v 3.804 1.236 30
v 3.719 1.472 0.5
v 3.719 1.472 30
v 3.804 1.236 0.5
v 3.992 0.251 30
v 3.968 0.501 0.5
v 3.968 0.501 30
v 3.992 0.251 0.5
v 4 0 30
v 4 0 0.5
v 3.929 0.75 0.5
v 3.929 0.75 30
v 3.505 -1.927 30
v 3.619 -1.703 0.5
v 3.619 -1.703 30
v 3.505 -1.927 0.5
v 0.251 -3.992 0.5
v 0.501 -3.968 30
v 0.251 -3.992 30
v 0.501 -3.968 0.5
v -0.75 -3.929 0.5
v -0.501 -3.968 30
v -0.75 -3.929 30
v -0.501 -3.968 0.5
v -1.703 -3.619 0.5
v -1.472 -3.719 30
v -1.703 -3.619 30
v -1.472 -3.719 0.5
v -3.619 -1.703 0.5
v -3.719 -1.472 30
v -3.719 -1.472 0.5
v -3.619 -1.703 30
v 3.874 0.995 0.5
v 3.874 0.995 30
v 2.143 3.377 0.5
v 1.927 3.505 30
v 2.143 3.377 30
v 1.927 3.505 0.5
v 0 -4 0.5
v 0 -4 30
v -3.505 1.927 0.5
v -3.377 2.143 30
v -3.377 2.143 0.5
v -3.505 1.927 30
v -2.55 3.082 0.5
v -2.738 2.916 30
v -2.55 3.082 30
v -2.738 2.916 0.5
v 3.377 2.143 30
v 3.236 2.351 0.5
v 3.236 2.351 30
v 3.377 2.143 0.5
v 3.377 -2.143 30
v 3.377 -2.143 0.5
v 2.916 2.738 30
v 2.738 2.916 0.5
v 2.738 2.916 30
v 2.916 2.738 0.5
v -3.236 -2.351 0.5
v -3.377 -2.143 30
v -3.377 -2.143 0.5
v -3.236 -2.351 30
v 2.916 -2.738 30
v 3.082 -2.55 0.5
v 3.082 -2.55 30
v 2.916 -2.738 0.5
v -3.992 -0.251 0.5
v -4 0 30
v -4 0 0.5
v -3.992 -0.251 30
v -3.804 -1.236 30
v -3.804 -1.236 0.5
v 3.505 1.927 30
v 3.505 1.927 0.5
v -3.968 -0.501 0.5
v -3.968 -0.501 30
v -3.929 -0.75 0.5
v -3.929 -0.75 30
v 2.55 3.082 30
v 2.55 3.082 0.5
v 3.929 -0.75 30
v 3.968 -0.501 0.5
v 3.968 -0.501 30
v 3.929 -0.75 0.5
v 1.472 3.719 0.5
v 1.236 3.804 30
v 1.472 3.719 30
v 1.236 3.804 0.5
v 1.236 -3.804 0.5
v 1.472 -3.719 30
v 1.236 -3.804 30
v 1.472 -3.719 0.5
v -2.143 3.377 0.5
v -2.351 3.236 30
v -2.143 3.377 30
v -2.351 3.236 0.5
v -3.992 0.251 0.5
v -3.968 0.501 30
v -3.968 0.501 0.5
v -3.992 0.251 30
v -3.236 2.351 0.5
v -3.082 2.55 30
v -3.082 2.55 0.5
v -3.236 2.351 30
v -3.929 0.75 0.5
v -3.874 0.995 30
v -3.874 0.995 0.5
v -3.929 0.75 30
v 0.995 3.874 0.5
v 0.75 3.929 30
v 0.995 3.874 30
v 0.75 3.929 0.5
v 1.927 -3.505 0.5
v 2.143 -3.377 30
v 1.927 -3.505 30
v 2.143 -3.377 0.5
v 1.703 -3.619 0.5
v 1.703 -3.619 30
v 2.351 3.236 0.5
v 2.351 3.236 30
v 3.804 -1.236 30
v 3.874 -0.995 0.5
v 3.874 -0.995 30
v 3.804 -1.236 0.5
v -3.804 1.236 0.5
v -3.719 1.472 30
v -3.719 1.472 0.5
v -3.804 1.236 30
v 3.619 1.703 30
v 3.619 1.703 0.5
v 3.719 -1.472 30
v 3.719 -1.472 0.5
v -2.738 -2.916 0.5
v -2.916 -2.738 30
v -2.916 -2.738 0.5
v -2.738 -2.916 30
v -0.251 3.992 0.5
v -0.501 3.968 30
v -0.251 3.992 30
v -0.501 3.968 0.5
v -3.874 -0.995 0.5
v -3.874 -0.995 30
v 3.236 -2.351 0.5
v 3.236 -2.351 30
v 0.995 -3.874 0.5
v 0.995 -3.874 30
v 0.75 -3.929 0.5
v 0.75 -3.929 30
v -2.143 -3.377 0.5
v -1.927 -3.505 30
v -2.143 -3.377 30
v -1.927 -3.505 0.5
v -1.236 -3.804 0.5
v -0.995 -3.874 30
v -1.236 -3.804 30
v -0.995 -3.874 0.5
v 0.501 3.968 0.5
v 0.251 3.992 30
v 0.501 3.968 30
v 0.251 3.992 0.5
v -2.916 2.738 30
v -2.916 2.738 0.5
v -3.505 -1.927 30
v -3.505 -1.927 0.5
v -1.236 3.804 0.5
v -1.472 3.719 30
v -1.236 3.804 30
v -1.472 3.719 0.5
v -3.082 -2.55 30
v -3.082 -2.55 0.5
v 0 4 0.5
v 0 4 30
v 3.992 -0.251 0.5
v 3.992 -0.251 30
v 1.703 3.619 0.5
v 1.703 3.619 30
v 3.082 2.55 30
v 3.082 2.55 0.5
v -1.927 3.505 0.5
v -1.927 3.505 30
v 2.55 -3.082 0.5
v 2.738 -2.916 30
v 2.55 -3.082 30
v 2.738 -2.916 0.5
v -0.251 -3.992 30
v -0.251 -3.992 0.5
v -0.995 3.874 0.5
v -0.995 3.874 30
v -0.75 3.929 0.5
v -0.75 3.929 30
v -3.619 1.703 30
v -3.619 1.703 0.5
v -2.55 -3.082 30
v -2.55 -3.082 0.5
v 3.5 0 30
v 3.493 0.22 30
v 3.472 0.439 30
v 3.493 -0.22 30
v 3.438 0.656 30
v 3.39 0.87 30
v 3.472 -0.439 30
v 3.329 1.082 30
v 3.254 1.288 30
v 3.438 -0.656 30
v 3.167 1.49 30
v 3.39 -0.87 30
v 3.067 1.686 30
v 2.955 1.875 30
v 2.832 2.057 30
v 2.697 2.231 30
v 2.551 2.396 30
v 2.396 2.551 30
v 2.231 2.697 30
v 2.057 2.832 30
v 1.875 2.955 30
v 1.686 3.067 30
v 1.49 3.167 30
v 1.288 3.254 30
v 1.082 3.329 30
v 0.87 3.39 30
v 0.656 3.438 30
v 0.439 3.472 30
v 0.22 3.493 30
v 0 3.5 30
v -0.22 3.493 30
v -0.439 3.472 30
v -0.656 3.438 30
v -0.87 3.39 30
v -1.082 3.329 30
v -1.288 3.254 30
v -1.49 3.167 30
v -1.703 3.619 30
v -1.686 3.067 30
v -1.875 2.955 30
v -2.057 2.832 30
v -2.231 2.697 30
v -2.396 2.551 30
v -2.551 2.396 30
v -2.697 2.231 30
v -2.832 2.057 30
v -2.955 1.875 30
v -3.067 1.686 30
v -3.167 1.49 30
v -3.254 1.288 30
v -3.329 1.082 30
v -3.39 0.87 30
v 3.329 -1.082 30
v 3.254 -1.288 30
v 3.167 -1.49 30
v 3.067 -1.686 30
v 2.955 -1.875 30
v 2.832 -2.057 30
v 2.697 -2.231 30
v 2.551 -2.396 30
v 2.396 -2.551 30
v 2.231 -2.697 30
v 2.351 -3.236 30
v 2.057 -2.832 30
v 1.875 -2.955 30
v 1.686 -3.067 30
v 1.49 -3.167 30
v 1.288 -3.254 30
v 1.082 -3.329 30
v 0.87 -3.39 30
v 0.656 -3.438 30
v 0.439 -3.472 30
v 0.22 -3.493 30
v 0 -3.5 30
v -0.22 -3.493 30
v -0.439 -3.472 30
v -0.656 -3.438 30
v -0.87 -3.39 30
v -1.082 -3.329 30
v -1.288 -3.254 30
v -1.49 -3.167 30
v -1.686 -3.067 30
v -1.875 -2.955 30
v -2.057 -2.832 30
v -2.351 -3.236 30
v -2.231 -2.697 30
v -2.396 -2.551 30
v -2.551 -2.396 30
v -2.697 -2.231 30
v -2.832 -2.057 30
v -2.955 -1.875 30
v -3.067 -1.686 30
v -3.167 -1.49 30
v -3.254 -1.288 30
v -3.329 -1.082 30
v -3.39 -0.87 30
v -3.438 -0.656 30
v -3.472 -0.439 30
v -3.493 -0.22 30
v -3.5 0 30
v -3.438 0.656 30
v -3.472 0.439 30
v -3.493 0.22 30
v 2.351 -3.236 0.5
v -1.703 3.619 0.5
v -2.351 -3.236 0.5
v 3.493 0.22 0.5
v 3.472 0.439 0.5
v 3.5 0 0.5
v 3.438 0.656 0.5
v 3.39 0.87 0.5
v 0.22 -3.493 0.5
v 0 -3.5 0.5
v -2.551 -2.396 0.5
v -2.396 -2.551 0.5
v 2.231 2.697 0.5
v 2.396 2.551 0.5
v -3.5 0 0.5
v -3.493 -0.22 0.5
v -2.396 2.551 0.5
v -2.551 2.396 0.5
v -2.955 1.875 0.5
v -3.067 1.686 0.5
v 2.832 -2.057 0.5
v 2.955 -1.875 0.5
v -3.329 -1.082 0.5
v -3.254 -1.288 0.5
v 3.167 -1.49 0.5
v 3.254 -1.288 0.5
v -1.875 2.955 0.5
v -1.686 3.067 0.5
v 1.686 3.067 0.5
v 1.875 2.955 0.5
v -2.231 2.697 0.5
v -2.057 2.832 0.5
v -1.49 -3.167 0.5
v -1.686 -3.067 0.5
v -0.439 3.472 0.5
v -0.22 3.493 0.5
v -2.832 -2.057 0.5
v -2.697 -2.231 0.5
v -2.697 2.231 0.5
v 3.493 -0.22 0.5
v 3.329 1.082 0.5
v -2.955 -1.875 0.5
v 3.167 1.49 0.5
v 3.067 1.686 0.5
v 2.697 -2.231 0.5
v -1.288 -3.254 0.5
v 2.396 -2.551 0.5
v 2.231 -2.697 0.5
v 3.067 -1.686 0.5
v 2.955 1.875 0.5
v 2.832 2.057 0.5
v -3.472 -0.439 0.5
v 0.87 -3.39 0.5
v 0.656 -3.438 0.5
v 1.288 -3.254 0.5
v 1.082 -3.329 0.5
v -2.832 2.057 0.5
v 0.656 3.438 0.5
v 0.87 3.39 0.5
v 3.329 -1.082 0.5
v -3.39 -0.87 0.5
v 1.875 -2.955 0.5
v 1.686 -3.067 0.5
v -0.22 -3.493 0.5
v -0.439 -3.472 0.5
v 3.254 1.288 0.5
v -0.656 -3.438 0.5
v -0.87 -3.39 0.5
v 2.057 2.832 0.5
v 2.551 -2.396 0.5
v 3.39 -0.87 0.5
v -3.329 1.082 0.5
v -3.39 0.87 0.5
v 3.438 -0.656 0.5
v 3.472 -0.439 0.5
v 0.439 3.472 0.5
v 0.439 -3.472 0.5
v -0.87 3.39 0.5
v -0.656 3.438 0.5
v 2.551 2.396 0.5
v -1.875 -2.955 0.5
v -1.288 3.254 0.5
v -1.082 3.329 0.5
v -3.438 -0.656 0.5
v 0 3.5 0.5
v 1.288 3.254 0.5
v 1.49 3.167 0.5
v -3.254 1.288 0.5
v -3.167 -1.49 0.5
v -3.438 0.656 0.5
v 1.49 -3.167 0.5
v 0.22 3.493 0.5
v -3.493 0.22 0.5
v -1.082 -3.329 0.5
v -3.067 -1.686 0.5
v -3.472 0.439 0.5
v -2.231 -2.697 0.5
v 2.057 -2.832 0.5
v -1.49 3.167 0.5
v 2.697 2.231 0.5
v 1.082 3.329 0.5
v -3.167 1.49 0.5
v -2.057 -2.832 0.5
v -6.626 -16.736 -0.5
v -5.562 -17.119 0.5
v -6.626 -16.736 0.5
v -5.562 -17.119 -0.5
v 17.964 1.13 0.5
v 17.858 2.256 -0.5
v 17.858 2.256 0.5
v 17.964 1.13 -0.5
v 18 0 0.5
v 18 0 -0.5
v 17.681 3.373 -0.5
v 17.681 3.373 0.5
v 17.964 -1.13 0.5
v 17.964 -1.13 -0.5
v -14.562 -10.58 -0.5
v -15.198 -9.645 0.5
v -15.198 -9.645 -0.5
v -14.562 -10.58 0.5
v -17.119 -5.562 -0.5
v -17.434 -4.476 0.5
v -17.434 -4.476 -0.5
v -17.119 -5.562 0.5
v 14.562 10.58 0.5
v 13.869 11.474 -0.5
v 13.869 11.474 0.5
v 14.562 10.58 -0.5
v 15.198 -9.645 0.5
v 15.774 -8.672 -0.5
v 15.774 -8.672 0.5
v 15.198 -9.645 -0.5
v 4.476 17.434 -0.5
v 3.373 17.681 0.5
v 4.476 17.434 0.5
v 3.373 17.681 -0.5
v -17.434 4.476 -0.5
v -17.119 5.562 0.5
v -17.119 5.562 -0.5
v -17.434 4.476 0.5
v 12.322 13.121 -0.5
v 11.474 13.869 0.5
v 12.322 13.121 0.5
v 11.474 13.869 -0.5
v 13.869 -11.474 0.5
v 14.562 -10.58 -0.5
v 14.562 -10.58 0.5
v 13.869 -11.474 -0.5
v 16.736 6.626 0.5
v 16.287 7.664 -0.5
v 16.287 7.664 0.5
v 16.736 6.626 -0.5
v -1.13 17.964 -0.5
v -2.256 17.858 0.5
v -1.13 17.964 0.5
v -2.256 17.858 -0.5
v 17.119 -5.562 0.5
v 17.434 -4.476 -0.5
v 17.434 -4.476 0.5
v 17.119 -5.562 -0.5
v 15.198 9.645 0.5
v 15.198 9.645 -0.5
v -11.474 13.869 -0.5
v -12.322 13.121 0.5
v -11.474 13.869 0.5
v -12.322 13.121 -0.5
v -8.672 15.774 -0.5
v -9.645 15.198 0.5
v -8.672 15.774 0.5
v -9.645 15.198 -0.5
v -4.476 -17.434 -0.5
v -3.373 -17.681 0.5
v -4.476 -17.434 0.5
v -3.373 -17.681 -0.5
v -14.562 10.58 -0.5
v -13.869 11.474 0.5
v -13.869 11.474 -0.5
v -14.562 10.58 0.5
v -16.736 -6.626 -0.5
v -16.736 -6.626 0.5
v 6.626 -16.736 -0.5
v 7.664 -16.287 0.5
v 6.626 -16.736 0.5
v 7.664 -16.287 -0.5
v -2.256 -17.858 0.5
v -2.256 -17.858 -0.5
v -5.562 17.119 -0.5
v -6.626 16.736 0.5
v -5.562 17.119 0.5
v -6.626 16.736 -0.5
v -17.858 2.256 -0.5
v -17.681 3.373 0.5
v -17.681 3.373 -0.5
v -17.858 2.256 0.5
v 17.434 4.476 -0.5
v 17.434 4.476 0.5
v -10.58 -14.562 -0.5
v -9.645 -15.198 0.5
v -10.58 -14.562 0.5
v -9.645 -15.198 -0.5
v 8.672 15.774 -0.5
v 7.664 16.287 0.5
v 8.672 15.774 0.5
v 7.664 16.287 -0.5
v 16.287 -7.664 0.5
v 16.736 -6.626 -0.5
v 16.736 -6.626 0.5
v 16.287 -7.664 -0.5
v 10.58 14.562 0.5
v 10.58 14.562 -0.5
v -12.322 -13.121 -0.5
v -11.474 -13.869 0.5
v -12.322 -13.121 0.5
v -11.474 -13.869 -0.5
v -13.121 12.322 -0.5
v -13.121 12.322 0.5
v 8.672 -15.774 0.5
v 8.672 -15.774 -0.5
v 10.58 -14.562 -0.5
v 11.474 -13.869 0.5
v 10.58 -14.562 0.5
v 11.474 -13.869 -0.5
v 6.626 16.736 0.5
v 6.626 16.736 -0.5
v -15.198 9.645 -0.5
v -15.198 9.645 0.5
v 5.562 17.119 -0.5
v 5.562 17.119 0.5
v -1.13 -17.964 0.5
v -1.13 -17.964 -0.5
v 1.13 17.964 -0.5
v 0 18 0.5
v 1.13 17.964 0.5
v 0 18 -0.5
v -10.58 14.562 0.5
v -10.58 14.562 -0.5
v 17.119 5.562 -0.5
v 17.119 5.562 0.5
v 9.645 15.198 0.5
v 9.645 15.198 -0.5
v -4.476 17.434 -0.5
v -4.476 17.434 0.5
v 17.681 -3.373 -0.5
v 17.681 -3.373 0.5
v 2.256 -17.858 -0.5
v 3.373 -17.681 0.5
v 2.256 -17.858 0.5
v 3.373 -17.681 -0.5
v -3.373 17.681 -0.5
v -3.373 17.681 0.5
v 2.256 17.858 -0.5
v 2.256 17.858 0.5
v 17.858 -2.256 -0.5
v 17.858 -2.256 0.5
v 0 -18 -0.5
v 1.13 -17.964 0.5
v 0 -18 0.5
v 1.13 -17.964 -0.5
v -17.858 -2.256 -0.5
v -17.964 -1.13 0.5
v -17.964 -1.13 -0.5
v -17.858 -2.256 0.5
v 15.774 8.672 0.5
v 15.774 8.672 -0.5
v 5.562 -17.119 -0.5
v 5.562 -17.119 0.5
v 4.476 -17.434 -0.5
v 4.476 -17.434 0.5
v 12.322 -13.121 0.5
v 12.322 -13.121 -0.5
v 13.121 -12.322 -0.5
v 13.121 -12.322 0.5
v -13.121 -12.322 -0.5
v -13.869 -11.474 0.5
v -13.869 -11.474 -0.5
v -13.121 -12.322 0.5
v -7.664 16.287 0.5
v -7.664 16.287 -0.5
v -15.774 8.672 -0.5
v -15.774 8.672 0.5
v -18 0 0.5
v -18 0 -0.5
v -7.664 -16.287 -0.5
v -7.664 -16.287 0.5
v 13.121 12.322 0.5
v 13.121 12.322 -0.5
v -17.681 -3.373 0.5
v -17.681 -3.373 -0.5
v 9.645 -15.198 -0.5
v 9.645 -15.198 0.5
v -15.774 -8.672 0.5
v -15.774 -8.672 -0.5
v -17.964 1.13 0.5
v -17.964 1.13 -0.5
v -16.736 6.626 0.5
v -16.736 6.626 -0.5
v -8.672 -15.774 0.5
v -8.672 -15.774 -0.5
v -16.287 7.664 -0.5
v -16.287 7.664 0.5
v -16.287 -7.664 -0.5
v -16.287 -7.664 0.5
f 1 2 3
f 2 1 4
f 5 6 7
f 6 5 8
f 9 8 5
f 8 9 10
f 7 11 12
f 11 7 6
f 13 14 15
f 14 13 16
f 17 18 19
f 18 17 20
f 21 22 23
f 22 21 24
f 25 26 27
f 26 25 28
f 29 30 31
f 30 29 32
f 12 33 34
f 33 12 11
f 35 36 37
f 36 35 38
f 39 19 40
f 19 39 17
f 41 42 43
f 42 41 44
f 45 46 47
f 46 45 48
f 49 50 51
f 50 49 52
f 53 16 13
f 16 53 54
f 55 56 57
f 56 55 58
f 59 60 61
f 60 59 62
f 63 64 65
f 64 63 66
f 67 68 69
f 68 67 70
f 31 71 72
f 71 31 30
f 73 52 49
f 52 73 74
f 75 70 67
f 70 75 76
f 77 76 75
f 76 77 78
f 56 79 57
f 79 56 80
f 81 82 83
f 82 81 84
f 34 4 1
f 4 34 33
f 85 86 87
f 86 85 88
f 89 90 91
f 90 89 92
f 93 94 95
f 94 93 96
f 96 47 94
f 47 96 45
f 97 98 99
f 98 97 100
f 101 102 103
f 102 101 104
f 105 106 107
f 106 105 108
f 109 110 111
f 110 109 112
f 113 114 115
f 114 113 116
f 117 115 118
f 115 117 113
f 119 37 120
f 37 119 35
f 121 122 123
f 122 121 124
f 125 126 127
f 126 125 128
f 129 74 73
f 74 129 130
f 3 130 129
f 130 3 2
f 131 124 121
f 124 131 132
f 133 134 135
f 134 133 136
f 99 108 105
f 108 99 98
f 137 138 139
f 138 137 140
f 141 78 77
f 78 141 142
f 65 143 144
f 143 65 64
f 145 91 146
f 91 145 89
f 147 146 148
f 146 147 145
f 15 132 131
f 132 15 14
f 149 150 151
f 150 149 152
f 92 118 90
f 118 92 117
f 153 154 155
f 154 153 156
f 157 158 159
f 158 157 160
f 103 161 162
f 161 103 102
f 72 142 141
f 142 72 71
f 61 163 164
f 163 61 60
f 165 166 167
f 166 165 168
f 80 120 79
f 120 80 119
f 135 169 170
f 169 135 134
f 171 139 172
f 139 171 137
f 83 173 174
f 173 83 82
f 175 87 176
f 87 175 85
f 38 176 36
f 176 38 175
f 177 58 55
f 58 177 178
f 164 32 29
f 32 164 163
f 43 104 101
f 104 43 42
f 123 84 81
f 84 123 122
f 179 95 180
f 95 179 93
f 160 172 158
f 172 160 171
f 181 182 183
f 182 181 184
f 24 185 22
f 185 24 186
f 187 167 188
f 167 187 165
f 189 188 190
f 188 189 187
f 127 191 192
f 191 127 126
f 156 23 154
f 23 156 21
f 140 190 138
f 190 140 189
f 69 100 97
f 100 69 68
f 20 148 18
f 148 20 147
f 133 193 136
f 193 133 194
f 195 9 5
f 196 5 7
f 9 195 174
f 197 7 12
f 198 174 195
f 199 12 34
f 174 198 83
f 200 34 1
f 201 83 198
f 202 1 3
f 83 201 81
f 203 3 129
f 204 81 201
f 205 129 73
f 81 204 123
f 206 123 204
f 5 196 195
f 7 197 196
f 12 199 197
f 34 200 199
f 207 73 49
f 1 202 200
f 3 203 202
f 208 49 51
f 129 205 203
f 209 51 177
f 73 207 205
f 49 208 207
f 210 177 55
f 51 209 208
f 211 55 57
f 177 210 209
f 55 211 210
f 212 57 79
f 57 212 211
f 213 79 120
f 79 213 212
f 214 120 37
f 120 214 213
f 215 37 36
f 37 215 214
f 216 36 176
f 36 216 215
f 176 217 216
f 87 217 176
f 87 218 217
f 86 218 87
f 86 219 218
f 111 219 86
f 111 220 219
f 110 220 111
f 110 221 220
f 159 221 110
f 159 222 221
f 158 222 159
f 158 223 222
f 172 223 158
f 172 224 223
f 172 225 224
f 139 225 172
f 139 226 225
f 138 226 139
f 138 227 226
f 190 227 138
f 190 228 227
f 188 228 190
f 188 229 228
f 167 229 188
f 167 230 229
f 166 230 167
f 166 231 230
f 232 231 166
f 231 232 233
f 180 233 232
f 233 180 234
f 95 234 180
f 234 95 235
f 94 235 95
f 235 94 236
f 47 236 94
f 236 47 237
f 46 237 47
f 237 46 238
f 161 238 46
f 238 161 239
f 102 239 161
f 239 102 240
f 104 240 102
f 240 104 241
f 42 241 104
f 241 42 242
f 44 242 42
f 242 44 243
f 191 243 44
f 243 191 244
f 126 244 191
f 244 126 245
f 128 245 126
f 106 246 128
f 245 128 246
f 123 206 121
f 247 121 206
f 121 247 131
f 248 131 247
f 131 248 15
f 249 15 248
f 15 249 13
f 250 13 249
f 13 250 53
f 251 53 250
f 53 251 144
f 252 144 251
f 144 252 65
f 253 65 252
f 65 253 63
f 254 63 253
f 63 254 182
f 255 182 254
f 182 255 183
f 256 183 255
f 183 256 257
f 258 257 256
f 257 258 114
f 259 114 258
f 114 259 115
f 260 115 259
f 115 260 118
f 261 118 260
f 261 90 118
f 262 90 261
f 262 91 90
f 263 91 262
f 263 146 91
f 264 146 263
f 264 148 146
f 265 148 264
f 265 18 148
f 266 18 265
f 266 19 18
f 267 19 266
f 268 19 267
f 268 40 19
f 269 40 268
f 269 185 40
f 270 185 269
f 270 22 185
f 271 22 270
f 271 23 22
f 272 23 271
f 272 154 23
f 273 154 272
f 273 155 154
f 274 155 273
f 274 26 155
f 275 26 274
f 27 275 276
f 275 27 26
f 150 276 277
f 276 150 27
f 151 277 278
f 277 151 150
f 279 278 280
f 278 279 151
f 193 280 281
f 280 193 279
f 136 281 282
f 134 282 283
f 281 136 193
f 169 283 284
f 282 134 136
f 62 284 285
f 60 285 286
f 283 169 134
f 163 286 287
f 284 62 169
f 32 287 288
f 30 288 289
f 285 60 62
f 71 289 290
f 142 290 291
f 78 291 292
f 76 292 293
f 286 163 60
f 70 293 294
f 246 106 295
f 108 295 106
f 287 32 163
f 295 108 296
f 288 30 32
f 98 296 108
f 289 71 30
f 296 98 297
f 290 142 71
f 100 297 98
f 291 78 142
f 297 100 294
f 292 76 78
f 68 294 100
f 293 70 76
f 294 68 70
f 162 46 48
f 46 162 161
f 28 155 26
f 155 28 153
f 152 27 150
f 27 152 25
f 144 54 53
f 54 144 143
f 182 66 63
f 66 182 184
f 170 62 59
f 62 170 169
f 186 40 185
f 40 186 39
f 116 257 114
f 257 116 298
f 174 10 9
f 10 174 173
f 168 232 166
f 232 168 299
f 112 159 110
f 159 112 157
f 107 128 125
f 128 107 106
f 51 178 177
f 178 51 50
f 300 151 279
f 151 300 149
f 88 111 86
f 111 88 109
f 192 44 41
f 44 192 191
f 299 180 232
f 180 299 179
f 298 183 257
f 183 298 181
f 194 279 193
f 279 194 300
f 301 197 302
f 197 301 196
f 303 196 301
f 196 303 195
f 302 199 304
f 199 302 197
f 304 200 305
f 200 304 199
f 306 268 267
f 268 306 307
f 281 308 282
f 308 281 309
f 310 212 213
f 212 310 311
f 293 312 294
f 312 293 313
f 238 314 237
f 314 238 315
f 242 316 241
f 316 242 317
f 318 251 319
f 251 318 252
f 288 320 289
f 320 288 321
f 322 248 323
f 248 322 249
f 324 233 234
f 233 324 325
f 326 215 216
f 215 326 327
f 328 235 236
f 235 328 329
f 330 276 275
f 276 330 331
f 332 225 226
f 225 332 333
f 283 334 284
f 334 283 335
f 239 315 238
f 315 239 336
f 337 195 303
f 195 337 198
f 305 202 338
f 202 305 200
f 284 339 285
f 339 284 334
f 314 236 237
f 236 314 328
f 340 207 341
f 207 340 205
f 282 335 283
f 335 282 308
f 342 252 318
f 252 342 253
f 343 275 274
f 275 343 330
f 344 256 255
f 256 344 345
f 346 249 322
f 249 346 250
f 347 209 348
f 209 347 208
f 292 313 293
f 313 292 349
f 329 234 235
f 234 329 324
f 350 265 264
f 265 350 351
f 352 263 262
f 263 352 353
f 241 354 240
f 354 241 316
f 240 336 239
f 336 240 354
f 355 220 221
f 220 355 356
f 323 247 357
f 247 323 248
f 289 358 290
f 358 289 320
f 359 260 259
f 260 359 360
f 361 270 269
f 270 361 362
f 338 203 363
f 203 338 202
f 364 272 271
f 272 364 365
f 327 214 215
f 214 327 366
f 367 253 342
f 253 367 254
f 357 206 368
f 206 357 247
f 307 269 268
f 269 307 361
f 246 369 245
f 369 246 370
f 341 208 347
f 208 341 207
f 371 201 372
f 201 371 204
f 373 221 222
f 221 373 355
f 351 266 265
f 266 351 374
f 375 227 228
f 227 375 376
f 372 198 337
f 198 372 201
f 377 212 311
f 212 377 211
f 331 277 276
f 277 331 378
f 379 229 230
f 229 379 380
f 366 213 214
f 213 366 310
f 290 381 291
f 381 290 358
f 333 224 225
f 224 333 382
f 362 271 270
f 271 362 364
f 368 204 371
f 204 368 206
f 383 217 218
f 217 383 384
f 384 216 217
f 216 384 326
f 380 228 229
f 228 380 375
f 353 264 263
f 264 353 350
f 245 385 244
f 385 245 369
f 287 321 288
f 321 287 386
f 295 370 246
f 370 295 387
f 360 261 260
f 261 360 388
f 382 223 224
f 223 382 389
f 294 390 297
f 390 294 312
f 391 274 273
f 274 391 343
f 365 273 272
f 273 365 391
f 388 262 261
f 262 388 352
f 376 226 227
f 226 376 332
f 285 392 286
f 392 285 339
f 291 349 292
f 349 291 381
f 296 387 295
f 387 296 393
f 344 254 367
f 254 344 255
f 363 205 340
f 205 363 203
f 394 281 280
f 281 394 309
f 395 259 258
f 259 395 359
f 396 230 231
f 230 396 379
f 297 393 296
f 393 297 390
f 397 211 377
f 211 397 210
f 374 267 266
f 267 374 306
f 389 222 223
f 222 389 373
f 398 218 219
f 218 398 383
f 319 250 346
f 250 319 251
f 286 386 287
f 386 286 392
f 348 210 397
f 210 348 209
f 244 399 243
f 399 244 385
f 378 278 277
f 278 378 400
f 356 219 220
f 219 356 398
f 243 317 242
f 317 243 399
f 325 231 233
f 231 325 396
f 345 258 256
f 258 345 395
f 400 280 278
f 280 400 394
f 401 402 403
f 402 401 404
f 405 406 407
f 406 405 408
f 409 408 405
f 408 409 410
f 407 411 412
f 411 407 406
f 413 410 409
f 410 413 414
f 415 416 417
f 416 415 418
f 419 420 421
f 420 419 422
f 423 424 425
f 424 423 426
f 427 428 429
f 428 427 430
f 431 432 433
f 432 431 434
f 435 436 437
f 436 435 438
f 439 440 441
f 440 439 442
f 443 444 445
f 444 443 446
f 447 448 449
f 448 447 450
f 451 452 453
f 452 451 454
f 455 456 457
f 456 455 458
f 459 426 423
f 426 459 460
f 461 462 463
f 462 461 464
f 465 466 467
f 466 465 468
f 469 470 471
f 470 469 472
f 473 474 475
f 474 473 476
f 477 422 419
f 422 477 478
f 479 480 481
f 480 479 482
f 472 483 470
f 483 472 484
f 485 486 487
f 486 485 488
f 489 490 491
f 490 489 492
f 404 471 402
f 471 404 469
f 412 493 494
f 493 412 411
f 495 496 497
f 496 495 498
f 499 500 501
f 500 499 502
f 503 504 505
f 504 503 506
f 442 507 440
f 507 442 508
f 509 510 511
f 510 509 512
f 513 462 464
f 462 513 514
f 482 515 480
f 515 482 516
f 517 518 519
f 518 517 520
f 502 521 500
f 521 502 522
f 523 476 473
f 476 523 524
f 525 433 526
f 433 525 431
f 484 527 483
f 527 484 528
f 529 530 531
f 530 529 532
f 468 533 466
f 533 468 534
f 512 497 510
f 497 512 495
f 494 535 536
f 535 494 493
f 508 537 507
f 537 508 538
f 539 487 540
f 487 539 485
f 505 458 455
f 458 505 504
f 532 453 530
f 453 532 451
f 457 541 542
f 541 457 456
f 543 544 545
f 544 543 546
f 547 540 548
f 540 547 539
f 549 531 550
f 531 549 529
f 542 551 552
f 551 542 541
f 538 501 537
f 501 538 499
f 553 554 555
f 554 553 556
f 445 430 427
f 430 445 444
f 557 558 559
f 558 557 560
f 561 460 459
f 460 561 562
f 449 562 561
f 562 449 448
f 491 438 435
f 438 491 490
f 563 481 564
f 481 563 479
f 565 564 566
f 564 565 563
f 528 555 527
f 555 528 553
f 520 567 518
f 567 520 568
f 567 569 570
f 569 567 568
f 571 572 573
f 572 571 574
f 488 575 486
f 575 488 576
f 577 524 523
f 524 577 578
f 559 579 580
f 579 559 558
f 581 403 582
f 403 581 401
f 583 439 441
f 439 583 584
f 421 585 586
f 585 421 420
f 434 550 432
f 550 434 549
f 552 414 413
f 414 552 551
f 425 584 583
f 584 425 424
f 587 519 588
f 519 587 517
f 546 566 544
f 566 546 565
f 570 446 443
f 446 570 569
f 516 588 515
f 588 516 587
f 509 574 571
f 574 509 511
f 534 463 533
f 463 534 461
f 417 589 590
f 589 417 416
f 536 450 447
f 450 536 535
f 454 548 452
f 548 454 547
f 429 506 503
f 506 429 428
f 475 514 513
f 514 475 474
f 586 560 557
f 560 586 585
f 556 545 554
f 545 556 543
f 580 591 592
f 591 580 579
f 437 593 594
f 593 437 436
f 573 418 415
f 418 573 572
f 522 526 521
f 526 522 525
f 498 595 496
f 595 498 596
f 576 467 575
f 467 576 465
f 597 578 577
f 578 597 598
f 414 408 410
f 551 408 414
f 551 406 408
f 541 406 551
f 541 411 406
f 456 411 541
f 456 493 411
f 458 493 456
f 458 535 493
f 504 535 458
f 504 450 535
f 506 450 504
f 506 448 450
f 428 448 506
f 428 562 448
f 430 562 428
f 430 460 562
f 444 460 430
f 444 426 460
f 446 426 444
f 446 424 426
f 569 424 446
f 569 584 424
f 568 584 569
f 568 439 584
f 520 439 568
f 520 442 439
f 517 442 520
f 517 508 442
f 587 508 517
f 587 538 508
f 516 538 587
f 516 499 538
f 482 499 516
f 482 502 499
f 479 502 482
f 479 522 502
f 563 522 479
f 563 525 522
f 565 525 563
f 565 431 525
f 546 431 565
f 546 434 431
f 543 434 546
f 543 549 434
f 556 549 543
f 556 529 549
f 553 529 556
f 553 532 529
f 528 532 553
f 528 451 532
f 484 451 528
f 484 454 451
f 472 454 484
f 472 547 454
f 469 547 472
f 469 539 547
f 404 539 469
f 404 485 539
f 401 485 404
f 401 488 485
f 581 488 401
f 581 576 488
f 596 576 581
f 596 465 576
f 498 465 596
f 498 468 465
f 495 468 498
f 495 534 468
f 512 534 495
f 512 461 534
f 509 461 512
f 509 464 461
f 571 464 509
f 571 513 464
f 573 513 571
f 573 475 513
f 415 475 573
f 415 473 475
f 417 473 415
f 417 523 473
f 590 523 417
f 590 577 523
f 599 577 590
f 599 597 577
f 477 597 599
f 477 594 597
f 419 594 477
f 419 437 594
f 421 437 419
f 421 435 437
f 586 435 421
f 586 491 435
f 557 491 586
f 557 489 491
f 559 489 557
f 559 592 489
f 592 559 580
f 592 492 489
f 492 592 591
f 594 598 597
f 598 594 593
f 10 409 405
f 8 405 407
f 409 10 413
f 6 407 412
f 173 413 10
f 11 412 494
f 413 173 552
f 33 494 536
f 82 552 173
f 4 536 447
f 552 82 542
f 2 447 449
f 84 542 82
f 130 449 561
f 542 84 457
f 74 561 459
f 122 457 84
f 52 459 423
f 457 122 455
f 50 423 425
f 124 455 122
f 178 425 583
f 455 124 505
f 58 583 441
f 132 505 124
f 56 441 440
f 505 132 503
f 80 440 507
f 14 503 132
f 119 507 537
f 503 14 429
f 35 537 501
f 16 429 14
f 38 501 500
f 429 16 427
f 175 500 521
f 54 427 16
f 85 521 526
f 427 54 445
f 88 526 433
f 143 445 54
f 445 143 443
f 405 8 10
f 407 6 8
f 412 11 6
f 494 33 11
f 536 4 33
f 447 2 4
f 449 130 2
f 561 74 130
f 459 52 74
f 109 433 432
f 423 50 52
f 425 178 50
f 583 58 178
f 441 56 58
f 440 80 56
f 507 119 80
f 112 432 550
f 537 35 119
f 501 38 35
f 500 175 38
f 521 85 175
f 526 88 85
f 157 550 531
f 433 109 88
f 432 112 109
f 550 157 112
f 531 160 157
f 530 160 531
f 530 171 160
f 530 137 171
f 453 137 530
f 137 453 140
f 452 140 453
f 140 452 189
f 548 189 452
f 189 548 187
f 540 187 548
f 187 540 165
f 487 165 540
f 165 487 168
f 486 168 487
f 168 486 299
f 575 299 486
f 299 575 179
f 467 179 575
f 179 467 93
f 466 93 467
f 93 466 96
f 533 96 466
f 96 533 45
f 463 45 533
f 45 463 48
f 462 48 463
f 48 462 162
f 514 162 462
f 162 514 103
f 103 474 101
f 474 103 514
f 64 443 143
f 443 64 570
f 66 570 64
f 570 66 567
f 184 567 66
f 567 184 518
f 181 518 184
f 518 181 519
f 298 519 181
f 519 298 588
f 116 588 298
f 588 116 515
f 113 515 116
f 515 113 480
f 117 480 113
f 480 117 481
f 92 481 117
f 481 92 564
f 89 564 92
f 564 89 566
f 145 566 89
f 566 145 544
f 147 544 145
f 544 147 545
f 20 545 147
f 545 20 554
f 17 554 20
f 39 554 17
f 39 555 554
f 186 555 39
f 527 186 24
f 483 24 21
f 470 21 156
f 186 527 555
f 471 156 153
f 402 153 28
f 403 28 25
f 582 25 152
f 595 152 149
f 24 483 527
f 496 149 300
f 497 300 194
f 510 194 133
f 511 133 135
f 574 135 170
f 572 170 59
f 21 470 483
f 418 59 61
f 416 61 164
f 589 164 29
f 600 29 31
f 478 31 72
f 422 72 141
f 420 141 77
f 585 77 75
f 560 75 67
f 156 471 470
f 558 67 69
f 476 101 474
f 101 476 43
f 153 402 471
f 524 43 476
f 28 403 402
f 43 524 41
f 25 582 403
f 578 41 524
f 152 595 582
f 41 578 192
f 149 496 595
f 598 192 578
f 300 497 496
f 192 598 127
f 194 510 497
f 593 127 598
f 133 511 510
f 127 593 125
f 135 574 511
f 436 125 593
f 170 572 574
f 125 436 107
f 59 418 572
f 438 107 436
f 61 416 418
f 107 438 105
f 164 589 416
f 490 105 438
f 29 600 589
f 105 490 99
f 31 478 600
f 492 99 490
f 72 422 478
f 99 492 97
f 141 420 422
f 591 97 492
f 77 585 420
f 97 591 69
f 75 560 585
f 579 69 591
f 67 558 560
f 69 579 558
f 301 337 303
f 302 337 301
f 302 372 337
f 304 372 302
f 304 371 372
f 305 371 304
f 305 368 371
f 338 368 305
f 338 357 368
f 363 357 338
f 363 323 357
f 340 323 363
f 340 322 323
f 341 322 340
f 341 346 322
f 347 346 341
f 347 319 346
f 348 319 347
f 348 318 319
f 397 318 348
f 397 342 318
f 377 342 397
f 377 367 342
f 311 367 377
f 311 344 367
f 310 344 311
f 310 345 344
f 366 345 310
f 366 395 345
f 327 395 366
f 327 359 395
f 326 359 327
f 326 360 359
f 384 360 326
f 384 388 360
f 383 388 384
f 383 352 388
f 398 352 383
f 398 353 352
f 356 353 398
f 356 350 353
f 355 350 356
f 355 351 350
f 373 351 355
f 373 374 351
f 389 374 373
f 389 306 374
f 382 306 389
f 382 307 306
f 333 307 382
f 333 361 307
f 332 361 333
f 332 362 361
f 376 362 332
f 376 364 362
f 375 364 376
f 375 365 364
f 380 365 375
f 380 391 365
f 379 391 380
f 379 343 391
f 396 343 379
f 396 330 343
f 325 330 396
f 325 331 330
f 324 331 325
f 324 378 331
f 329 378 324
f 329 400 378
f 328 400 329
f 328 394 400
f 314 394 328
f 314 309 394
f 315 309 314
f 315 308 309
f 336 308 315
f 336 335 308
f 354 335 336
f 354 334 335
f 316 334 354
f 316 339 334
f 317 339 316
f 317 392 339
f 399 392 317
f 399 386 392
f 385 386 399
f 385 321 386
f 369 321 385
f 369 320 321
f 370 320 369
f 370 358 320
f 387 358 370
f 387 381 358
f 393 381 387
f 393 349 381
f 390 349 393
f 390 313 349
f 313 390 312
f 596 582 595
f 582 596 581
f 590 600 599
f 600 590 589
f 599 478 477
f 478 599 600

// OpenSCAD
$fn = 100;
translate([0,0,15]) {
    difference() {
        cylinder(30,4,4,true);
        cylinder(32,3.5,3.5,true);
    }
}
cylinder(1,18,18,true);
